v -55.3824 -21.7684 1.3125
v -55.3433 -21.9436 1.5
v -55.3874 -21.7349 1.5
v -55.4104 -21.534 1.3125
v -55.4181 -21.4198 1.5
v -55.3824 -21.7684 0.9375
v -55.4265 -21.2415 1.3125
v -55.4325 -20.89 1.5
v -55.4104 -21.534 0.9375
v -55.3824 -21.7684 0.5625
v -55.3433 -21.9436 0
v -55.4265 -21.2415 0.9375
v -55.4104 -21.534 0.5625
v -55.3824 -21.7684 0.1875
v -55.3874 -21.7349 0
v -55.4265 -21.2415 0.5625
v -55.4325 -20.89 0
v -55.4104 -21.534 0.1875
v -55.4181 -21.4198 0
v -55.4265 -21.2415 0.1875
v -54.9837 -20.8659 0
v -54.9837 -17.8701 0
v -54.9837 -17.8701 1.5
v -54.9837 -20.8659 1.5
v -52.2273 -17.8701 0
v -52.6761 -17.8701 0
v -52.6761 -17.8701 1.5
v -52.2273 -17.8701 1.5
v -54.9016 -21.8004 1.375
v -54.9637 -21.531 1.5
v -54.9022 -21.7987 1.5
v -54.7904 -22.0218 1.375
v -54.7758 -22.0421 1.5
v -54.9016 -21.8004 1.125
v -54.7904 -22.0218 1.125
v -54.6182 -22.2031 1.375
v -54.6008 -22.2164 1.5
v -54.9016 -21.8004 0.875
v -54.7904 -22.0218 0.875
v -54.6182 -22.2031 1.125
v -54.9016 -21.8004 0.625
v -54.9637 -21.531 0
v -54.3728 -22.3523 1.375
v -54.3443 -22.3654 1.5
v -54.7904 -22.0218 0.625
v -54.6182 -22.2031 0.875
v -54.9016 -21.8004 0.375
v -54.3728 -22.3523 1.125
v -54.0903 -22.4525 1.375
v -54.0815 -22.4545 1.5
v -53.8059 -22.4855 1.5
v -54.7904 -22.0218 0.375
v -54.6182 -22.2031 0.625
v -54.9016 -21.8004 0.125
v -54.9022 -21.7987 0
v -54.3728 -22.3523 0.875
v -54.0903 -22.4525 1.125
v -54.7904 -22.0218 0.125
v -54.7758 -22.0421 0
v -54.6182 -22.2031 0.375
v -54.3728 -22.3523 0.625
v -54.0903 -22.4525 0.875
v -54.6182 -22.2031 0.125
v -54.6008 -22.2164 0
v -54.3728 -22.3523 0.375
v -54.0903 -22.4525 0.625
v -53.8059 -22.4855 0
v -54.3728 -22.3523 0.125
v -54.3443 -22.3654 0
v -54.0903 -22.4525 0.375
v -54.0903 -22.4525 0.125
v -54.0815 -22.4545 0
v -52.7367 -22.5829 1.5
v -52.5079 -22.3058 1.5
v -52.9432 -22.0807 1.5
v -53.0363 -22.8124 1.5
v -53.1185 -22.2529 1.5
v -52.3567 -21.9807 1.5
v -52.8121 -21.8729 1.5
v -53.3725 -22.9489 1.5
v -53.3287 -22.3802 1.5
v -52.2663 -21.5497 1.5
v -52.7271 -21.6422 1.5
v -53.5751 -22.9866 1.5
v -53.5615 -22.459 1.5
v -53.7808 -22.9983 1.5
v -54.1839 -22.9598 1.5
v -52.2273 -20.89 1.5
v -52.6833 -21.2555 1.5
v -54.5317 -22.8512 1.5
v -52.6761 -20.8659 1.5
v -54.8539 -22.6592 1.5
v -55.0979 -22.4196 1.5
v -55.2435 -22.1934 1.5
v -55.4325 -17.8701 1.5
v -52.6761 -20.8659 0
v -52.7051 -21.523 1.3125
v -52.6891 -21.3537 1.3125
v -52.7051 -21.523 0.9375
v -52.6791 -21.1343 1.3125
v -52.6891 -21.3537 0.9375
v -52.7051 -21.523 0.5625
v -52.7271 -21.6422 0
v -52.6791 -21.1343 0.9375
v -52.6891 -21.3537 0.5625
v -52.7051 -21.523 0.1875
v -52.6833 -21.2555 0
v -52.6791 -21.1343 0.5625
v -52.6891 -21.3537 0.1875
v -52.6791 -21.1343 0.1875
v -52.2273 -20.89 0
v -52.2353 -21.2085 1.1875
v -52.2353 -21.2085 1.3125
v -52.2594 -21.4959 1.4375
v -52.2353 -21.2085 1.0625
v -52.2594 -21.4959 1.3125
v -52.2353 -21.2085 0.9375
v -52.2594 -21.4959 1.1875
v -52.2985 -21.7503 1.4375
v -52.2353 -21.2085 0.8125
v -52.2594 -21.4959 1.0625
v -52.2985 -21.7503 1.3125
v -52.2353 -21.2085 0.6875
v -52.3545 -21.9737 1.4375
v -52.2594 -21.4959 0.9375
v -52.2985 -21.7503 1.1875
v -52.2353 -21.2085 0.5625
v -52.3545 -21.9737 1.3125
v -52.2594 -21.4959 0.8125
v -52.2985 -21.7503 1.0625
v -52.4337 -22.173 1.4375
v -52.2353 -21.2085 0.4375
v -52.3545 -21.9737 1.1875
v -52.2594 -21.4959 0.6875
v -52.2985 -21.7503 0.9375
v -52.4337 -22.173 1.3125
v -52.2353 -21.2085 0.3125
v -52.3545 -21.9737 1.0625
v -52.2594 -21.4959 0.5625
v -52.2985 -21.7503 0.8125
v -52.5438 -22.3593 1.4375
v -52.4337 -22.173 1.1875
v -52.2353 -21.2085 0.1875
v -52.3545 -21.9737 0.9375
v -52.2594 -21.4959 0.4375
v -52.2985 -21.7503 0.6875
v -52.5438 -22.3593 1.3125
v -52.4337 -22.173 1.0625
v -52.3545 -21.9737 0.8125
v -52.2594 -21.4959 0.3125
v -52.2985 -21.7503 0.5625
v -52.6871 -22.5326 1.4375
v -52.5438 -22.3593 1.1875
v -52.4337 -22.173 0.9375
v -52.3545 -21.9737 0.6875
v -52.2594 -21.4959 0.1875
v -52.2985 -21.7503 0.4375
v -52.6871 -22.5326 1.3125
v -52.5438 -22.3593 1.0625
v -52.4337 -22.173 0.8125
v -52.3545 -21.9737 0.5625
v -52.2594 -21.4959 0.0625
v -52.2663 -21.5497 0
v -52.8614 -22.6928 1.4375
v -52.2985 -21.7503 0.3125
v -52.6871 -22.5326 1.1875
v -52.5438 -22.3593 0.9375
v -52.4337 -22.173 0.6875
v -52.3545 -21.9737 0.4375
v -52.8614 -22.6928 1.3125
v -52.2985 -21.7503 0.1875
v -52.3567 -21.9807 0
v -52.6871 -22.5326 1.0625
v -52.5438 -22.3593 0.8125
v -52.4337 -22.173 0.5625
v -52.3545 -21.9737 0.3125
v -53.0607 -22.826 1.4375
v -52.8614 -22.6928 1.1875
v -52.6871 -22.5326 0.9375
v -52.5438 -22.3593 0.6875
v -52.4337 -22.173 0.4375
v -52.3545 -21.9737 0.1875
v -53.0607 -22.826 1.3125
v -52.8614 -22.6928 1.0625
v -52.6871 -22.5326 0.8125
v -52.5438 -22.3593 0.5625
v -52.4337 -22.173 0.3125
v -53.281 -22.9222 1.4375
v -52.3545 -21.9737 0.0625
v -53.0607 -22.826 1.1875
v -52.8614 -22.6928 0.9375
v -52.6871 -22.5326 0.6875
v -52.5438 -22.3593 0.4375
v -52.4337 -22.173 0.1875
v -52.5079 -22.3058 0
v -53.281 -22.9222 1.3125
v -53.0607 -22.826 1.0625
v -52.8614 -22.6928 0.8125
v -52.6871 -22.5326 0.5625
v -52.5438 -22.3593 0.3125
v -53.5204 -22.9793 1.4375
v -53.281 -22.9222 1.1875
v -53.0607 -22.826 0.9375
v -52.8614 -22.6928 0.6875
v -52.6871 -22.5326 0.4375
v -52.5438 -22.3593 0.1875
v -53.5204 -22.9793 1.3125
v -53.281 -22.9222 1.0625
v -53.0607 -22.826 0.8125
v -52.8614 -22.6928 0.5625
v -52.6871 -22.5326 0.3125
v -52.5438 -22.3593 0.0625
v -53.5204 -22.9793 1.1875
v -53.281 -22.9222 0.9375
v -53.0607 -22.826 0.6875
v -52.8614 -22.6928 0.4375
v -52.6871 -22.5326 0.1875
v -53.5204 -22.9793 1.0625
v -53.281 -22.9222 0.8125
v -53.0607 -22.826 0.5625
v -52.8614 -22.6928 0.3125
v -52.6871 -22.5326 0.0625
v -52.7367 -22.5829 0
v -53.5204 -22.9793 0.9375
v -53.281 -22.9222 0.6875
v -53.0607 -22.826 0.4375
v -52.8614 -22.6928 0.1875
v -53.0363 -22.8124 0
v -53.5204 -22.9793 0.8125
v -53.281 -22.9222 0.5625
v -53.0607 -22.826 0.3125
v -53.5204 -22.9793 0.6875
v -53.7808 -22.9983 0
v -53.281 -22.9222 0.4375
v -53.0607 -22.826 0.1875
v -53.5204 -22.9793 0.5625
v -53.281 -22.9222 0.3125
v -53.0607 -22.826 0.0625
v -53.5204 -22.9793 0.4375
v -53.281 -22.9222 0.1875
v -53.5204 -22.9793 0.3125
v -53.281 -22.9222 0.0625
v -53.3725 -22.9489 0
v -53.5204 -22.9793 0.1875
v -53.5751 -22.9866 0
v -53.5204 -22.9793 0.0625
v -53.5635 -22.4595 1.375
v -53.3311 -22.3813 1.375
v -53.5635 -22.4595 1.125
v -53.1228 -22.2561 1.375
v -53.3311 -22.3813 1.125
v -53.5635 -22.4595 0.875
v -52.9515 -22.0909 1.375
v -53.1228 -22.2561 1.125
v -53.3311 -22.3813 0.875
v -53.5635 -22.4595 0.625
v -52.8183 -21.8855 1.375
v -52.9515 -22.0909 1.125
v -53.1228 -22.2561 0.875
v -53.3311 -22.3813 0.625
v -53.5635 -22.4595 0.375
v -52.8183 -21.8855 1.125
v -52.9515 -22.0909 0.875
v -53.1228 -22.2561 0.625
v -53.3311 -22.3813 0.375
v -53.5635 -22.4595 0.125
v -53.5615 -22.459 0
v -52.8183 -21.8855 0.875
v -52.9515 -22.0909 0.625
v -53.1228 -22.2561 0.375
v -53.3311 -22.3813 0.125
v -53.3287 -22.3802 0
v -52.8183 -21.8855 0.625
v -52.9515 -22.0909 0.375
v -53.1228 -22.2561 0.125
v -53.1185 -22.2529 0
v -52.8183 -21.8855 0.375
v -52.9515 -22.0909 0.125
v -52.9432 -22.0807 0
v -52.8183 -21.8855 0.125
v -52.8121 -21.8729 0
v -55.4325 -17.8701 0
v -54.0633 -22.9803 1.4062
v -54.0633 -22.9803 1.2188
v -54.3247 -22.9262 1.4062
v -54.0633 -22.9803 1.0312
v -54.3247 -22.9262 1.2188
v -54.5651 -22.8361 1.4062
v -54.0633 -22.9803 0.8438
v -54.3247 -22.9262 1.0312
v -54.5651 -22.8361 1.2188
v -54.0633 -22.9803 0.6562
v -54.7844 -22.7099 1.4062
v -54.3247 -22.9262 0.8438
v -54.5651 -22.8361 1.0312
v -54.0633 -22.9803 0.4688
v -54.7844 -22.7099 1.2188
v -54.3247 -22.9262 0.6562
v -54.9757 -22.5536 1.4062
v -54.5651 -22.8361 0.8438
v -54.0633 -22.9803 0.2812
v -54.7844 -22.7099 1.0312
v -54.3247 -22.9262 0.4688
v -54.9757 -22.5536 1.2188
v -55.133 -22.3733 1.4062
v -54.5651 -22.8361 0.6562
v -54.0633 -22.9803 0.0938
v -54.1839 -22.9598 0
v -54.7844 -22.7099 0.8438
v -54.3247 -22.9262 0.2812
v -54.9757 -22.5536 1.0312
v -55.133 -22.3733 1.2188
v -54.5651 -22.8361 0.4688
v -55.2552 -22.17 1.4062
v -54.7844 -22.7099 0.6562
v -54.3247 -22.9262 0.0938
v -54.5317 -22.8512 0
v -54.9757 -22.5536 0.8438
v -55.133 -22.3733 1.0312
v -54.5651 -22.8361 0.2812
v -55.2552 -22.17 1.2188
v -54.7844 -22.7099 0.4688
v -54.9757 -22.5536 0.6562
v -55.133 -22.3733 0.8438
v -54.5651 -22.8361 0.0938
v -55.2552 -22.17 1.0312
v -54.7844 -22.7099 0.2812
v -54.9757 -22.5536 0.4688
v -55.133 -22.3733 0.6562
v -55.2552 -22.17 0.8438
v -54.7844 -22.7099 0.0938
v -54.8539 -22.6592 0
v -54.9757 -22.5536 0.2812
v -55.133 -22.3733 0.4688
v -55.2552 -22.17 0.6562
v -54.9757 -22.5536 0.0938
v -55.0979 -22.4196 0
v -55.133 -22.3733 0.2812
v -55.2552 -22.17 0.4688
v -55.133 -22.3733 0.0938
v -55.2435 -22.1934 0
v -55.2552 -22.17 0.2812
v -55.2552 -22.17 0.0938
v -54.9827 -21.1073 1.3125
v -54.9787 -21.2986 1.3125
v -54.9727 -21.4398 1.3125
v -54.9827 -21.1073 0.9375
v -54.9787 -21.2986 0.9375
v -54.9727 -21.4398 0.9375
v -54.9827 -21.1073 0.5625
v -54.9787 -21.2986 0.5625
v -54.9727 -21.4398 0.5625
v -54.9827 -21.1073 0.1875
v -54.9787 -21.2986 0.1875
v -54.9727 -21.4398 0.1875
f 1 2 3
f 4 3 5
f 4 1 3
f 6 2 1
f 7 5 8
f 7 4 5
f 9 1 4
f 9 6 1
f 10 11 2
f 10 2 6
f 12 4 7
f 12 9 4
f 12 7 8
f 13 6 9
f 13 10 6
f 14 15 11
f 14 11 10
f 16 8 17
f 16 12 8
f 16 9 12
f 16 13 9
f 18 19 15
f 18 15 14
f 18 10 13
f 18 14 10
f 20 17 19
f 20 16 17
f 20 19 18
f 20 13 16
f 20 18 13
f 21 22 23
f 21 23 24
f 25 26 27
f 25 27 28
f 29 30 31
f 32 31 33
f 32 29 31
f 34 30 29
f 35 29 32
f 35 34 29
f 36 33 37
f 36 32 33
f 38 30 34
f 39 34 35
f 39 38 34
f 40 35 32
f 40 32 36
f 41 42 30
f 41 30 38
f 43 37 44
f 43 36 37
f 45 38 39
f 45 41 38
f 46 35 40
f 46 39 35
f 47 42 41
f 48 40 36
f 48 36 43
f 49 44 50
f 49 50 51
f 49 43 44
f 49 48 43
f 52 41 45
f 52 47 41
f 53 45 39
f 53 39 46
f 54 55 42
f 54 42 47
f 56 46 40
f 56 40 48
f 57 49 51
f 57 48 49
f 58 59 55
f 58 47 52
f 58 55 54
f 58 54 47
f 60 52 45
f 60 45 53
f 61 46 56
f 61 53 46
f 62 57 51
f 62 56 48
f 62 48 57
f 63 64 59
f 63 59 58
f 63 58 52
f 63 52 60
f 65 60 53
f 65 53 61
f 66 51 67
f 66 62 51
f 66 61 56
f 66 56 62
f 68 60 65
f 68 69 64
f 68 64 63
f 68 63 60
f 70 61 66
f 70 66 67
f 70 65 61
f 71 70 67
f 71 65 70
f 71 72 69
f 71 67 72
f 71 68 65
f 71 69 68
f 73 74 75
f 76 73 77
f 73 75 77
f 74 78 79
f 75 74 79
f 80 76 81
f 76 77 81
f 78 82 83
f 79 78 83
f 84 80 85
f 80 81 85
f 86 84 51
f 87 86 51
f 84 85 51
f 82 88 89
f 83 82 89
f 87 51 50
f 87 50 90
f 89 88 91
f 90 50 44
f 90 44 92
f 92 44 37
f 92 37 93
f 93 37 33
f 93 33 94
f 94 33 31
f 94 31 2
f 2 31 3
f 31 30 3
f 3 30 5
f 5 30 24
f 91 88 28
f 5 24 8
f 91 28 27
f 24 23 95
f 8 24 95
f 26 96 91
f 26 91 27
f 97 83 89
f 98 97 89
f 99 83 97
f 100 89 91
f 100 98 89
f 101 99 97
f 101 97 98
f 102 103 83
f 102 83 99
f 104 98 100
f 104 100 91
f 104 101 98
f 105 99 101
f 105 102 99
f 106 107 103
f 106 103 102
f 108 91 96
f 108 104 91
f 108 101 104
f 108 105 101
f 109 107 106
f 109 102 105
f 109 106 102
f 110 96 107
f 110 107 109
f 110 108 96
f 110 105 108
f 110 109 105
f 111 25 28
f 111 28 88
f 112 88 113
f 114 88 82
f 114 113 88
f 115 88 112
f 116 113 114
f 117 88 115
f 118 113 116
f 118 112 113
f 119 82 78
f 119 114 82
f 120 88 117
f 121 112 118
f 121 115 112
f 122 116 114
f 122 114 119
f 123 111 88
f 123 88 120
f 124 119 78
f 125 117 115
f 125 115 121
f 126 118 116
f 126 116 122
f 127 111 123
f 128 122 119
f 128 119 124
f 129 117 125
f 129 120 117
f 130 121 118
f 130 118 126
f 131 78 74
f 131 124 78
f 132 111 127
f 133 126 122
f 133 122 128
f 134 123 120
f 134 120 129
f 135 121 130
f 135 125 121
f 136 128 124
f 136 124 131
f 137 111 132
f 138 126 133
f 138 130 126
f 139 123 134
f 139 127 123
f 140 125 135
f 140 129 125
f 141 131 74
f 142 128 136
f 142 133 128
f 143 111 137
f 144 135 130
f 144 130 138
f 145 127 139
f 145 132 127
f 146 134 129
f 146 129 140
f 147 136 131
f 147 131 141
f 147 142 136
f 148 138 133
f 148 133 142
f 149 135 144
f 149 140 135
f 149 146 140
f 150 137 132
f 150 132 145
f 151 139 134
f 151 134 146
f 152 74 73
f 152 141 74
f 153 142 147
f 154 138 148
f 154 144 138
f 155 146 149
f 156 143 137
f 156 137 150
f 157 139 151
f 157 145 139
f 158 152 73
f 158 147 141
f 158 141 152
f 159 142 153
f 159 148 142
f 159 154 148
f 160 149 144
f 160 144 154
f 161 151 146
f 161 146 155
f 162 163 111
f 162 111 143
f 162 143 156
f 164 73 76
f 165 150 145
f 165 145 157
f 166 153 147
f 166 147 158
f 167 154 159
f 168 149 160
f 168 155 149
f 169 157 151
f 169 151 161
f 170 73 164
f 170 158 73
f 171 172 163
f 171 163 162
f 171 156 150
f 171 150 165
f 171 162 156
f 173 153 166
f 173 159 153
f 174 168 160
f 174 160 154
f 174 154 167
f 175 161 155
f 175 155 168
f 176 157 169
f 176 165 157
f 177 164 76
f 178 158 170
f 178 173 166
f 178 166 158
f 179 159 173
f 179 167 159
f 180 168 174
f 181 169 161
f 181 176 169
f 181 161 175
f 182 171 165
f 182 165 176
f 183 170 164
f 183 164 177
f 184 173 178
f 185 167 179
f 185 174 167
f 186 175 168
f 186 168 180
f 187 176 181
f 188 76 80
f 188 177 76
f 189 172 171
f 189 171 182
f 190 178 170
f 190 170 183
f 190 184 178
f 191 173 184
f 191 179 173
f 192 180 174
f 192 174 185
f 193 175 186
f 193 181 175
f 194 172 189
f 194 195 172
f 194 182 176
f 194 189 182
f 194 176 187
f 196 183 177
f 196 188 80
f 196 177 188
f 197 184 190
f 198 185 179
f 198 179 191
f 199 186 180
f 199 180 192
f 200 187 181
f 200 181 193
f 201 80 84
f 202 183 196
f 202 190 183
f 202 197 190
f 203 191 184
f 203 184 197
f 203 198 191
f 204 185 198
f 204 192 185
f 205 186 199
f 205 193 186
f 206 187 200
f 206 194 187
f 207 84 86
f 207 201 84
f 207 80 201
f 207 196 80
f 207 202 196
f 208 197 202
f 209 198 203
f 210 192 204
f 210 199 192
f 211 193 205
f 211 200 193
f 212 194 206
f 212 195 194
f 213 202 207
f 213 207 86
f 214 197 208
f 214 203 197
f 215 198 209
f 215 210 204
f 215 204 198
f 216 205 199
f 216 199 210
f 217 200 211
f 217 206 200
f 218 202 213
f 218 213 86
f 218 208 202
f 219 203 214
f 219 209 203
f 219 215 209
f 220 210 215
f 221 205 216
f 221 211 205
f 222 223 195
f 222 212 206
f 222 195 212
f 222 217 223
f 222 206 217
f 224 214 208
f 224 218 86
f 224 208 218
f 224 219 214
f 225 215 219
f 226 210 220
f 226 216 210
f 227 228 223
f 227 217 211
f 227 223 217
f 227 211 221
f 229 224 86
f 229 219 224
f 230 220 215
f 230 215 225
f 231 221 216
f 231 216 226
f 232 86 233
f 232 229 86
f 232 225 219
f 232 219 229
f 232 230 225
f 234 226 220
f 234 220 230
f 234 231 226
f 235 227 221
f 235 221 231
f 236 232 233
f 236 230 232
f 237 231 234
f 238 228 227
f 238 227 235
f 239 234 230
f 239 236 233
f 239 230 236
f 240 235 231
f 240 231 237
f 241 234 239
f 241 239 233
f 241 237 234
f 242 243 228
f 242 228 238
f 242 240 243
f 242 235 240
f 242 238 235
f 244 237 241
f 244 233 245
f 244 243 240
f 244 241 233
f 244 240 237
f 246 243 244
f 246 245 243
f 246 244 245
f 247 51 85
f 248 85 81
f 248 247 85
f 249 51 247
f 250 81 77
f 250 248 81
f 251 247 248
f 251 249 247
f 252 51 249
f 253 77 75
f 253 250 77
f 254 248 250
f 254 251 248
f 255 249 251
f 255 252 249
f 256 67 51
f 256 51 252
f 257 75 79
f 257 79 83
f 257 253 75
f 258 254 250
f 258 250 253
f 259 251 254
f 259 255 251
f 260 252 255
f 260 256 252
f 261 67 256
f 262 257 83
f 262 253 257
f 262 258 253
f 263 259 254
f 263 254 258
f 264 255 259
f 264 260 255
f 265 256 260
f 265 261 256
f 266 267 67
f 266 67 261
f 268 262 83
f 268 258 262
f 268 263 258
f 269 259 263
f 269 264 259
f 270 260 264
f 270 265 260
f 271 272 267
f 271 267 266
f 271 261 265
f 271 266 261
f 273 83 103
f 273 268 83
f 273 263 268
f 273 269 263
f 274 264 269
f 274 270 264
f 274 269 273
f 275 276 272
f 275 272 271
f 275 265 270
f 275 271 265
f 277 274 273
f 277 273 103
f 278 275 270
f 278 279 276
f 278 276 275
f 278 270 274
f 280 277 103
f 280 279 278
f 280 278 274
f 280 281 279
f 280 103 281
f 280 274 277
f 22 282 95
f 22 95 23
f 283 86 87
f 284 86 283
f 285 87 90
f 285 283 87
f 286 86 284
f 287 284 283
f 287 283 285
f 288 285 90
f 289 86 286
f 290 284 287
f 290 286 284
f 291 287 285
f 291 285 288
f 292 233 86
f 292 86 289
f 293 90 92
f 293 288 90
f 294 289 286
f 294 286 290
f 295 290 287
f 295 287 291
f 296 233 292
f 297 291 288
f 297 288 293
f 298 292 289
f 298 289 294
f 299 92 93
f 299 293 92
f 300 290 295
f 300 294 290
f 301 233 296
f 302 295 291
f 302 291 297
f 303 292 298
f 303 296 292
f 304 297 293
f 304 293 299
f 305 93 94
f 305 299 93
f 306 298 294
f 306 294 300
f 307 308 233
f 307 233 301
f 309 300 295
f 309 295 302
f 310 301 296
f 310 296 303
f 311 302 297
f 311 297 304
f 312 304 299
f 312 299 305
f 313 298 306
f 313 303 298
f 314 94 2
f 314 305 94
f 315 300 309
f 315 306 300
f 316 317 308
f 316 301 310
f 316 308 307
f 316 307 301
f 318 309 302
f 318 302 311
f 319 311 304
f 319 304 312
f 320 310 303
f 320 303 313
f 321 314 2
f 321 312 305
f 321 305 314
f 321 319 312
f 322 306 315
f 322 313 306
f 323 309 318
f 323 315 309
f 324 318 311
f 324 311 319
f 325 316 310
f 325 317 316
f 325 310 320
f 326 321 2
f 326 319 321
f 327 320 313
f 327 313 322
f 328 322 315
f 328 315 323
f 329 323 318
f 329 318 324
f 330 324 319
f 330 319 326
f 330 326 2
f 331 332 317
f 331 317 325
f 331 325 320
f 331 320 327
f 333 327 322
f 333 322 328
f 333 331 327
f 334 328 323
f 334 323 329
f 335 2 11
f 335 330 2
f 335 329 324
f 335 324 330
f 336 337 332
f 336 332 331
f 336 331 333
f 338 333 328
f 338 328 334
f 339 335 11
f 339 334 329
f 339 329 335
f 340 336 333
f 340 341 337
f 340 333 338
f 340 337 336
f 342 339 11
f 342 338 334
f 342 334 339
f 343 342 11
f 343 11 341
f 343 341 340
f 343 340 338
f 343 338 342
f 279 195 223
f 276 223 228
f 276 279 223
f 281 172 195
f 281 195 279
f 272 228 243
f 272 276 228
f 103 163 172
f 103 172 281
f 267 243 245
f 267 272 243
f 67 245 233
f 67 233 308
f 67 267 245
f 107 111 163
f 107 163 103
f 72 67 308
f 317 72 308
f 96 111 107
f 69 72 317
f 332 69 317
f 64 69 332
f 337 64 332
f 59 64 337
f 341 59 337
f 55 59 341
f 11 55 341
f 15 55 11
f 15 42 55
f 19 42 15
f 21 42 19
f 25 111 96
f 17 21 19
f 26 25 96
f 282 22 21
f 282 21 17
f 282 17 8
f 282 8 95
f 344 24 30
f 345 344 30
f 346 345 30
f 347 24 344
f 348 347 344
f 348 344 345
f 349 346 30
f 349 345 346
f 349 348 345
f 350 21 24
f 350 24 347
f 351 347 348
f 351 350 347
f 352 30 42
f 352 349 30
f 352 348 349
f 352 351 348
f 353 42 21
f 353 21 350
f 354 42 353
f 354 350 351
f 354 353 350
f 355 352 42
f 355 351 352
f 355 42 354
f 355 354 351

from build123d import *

# Parameters (mm, degrees)
BOSS_EXTRU_1_DEPTH = 1.5


with BuildPart() as part:
    # Esquisse1 → Boss.-Extru.1 (new body)
    with BuildSketch(Plane.XY):
        with BuildLine():
            Line((-55.432465326, -17.870119076), (-54.983747377, -17.870119076))
            Line((-54.983747377, -17.870119076), (-54.983747377, -20.865912345))
            add(Edge.make_bspline(
                [(-54.983747377, -20.865912345), (-54.983814154, -20.908313397), (-54.983940875, -20.988776698), (-54.983094427, -21.103302841), (-54.980723901, -21.20512064), (-54.979229387, -21.294622565), (-54.975904625, -21.371397919), (-54.973193129, -21.435862648), (-54.96970662, -21.487711509), (-54.965516452, -21.517969975), (-54.963715326, -21.530976448)],
                knots=[0, 0, 0, 0, 1.528628734, 2.90083645, 4.128790002, 5.200304208, 6.127813768, 6.898992206, 7.526736466, 8, 8, 8, 8], degree=3))
            add(Edge.make_bspline(
                [(-54.963715326, -21.530976448), (-54.956318956, -21.577900396), (-54.941942976, -21.669104294), (-54.905305293, -21.798973269), (-54.854137435, -21.916018209), (-54.793504516, -22.023891482), (-54.713600786, -22.119590568), (-54.61788145, -22.207750072), (-54.501913209, -22.28485265), (-54.372969487, -22.355353809), (-54.233990576, -22.412018213), (-54.091974481, -22.454865876), (-53.949055939, -22.48097859), (-53.853375704, -22.484002217), (-53.805862762, -22.485503692)],
                knots=[0, 0, 0, 0, 1.035780045, 2.013197591, 2.933192213, 3.817615948, 4.702609284, 5.640816605, 6.646850145, 7.73207398, 8.84249596, 9.914020372, 10.964143139, 12, 12, 12, 12], degree=3))
            add(Edge.make_bspline(
                [(-53.805862762, -22.485503692), (-53.765071704, -22.48396962), (-53.683725187, -22.480910337), (-53.562858858, -22.461965435), (-53.445144417, -22.42782177), (-53.330000588, -22.383764972), (-53.22207061, -22.325554128), (-53.121294265, -22.258310071), (-53.031345787, -22.179437391), (-52.949262933, -22.092151185), (-52.877784453, -21.993665756), (-52.81582568, -21.886125559), (-52.765074352, -21.767912206), (-52.740012173, -21.68483446), (-52.7271368, -21.642154333)],
                knots=[0, 0, 0, 0, 0.994687771, 1.983630487, 2.973142513, 3.978332533, 4.983357753, 5.956394766, 6.925816176, 7.893390482, 8.871859704, 9.88551698, 10.913711441, 12, 12, 12, 12], degree=3))
            add(Edge.make_bspline(
                [(-52.7271368, -21.642154333), (-52.722850907, -21.624513512), (-52.71330021, -21.585202655), (-52.70437586, -21.518743668), (-52.695080823, -21.440330291), (-52.688631438, -21.34939913), (-52.68234398, -21.246254884), (-52.678582447, -21.13036023), (-52.676843829, -21.002136), (-52.676325714, -20.912654341), (-52.676055069, -20.865912345)],
                knots=[0, 0, 0, 0, 0.558680831, 1.244966039, 2.062412453, 2.990489873, 4.051219941, 5.244515665, 6.560634259, 8, 8, 8, 8], degree=3))
            Line((-52.676055069, -20.865912345), (-52.676055069, -17.870119076))
            Line((-52.676055069, -17.870119076), (-52.227337121, -17.870119076))
            Line((-52.227337121, -17.870119076), (-52.227337121, -20.889950807))
            add(Edge.make_bspline(
                [(-52.227337121, -20.889950807), (-52.22770015, -20.944377063), (-52.228408623, -21.05059321), (-52.234552304, -21.206238008), (-52.244348018, -21.353885124), (-52.258188144, -21.493554405), (-52.27652672, -21.624746061), (-52.296919892, -21.748610016), (-52.322890653, -21.864257148), (-52.353224084, -21.972589173), (-52.387900581, -22.075711335), (-52.432816507, -22.173580785), (-52.483422935, -22.269172784), (-52.543443868, -22.361041511), (-52.610888701, -22.44959373), (-52.687248244, -22.534292409), (-52.769997046, -22.616491046), (-52.860510702, -22.694081141), (-52.957297167, -22.765236393), (-53.060068535, -22.827804638), (-53.168035349, -22.88069552), (-53.280916958, -22.924232555), (-53.398761533, -22.956967696), (-53.521572047, -22.981360776), (-53.649628038, -22.995221201), (-53.736720404, -22.997281101), (-53.780822698, -22.998324204)],
                knots=[0, 0, 0, 0, 1.316592851, 2.569410997, 3.76748051, 4.895814652, 5.963796859, 6.97159953, 7.931736103, 8.829262218, 9.692595152, 10.560224239, 11.431080259, 12.30701507, 13.211635791, 14.121146779, 15.063487852, 16.031507147, 17.00238618, 17.966455255, 18.938106653, 19.907068911, 20.888905087, 21.893141452, 22.933117798, 24, 24, 24, 24], degree=3))
            add(Edge.make_bspline(
                [(-53.780822698, -22.998324204), (-53.828921416, -22.997203111), (-53.923290928, -22.99500353), (-54.06234531, -22.982399602), (-54.195651305, -22.958659038), (-54.324616844, -22.928430547), (-54.447486125, -22.886739494), (-54.565905331, -22.838027887), (-54.677846304, -22.778203229), (-54.78512506, -22.711641239), (-54.884874711, -22.636748899), (-54.97644243, -22.555120079), (-55.059979388, -22.468062397), (-55.134077526, -22.374633303), (-55.199964504, -22.275559436), (-55.256721951, -22.170560522), (-55.305455157, -22.059677213), (-55.330607396, -21.982601213), (-55.343322698, -21.943636704)],
                knots=[0, 0, 0, 0, 1.13879206, 2.234305948, 3.301075583, 4.341971843, 5.366689343, 6.369221514, 7.369726634, 8.367512178, 9.355451585, 10.318319045, 11.268648973, 12.207971039, 13.137398894, 14.081662264, 15.030215811, 16, 16, 16, 16], degree=3))
            add(Edge.make_bspline(
                [(-55.343322698, -21.943636704), (-55.350718638, -21.917018741), (-55.366760597, -21.859283785), (-55.383939594, -21.763731659), (-55.398381139, -21.653710348), (-55.411960508, -21.529212322), (-55.419973305, -21.390141084), (-55.426998217, -21.236556918), (-55.432514816, -21.068274116), (-55.432482284, -20.951053379), (-55.432465326, -20.889950807)],
                knots=[0, 0, 0, 0, 0.625038921, 1.35572334, 2.194682327, 3.136881307, 4.189498639, 5.346923369, 6.617055217, 8, 8, 8, 8], degree=3))
            Line((-55.432465326, -20.889950807), (-55.432465326, -17.870119076))
        make_face()
    extrude(amount=BOSS_EXTRU_1_DEPTH)


solid = part.part
